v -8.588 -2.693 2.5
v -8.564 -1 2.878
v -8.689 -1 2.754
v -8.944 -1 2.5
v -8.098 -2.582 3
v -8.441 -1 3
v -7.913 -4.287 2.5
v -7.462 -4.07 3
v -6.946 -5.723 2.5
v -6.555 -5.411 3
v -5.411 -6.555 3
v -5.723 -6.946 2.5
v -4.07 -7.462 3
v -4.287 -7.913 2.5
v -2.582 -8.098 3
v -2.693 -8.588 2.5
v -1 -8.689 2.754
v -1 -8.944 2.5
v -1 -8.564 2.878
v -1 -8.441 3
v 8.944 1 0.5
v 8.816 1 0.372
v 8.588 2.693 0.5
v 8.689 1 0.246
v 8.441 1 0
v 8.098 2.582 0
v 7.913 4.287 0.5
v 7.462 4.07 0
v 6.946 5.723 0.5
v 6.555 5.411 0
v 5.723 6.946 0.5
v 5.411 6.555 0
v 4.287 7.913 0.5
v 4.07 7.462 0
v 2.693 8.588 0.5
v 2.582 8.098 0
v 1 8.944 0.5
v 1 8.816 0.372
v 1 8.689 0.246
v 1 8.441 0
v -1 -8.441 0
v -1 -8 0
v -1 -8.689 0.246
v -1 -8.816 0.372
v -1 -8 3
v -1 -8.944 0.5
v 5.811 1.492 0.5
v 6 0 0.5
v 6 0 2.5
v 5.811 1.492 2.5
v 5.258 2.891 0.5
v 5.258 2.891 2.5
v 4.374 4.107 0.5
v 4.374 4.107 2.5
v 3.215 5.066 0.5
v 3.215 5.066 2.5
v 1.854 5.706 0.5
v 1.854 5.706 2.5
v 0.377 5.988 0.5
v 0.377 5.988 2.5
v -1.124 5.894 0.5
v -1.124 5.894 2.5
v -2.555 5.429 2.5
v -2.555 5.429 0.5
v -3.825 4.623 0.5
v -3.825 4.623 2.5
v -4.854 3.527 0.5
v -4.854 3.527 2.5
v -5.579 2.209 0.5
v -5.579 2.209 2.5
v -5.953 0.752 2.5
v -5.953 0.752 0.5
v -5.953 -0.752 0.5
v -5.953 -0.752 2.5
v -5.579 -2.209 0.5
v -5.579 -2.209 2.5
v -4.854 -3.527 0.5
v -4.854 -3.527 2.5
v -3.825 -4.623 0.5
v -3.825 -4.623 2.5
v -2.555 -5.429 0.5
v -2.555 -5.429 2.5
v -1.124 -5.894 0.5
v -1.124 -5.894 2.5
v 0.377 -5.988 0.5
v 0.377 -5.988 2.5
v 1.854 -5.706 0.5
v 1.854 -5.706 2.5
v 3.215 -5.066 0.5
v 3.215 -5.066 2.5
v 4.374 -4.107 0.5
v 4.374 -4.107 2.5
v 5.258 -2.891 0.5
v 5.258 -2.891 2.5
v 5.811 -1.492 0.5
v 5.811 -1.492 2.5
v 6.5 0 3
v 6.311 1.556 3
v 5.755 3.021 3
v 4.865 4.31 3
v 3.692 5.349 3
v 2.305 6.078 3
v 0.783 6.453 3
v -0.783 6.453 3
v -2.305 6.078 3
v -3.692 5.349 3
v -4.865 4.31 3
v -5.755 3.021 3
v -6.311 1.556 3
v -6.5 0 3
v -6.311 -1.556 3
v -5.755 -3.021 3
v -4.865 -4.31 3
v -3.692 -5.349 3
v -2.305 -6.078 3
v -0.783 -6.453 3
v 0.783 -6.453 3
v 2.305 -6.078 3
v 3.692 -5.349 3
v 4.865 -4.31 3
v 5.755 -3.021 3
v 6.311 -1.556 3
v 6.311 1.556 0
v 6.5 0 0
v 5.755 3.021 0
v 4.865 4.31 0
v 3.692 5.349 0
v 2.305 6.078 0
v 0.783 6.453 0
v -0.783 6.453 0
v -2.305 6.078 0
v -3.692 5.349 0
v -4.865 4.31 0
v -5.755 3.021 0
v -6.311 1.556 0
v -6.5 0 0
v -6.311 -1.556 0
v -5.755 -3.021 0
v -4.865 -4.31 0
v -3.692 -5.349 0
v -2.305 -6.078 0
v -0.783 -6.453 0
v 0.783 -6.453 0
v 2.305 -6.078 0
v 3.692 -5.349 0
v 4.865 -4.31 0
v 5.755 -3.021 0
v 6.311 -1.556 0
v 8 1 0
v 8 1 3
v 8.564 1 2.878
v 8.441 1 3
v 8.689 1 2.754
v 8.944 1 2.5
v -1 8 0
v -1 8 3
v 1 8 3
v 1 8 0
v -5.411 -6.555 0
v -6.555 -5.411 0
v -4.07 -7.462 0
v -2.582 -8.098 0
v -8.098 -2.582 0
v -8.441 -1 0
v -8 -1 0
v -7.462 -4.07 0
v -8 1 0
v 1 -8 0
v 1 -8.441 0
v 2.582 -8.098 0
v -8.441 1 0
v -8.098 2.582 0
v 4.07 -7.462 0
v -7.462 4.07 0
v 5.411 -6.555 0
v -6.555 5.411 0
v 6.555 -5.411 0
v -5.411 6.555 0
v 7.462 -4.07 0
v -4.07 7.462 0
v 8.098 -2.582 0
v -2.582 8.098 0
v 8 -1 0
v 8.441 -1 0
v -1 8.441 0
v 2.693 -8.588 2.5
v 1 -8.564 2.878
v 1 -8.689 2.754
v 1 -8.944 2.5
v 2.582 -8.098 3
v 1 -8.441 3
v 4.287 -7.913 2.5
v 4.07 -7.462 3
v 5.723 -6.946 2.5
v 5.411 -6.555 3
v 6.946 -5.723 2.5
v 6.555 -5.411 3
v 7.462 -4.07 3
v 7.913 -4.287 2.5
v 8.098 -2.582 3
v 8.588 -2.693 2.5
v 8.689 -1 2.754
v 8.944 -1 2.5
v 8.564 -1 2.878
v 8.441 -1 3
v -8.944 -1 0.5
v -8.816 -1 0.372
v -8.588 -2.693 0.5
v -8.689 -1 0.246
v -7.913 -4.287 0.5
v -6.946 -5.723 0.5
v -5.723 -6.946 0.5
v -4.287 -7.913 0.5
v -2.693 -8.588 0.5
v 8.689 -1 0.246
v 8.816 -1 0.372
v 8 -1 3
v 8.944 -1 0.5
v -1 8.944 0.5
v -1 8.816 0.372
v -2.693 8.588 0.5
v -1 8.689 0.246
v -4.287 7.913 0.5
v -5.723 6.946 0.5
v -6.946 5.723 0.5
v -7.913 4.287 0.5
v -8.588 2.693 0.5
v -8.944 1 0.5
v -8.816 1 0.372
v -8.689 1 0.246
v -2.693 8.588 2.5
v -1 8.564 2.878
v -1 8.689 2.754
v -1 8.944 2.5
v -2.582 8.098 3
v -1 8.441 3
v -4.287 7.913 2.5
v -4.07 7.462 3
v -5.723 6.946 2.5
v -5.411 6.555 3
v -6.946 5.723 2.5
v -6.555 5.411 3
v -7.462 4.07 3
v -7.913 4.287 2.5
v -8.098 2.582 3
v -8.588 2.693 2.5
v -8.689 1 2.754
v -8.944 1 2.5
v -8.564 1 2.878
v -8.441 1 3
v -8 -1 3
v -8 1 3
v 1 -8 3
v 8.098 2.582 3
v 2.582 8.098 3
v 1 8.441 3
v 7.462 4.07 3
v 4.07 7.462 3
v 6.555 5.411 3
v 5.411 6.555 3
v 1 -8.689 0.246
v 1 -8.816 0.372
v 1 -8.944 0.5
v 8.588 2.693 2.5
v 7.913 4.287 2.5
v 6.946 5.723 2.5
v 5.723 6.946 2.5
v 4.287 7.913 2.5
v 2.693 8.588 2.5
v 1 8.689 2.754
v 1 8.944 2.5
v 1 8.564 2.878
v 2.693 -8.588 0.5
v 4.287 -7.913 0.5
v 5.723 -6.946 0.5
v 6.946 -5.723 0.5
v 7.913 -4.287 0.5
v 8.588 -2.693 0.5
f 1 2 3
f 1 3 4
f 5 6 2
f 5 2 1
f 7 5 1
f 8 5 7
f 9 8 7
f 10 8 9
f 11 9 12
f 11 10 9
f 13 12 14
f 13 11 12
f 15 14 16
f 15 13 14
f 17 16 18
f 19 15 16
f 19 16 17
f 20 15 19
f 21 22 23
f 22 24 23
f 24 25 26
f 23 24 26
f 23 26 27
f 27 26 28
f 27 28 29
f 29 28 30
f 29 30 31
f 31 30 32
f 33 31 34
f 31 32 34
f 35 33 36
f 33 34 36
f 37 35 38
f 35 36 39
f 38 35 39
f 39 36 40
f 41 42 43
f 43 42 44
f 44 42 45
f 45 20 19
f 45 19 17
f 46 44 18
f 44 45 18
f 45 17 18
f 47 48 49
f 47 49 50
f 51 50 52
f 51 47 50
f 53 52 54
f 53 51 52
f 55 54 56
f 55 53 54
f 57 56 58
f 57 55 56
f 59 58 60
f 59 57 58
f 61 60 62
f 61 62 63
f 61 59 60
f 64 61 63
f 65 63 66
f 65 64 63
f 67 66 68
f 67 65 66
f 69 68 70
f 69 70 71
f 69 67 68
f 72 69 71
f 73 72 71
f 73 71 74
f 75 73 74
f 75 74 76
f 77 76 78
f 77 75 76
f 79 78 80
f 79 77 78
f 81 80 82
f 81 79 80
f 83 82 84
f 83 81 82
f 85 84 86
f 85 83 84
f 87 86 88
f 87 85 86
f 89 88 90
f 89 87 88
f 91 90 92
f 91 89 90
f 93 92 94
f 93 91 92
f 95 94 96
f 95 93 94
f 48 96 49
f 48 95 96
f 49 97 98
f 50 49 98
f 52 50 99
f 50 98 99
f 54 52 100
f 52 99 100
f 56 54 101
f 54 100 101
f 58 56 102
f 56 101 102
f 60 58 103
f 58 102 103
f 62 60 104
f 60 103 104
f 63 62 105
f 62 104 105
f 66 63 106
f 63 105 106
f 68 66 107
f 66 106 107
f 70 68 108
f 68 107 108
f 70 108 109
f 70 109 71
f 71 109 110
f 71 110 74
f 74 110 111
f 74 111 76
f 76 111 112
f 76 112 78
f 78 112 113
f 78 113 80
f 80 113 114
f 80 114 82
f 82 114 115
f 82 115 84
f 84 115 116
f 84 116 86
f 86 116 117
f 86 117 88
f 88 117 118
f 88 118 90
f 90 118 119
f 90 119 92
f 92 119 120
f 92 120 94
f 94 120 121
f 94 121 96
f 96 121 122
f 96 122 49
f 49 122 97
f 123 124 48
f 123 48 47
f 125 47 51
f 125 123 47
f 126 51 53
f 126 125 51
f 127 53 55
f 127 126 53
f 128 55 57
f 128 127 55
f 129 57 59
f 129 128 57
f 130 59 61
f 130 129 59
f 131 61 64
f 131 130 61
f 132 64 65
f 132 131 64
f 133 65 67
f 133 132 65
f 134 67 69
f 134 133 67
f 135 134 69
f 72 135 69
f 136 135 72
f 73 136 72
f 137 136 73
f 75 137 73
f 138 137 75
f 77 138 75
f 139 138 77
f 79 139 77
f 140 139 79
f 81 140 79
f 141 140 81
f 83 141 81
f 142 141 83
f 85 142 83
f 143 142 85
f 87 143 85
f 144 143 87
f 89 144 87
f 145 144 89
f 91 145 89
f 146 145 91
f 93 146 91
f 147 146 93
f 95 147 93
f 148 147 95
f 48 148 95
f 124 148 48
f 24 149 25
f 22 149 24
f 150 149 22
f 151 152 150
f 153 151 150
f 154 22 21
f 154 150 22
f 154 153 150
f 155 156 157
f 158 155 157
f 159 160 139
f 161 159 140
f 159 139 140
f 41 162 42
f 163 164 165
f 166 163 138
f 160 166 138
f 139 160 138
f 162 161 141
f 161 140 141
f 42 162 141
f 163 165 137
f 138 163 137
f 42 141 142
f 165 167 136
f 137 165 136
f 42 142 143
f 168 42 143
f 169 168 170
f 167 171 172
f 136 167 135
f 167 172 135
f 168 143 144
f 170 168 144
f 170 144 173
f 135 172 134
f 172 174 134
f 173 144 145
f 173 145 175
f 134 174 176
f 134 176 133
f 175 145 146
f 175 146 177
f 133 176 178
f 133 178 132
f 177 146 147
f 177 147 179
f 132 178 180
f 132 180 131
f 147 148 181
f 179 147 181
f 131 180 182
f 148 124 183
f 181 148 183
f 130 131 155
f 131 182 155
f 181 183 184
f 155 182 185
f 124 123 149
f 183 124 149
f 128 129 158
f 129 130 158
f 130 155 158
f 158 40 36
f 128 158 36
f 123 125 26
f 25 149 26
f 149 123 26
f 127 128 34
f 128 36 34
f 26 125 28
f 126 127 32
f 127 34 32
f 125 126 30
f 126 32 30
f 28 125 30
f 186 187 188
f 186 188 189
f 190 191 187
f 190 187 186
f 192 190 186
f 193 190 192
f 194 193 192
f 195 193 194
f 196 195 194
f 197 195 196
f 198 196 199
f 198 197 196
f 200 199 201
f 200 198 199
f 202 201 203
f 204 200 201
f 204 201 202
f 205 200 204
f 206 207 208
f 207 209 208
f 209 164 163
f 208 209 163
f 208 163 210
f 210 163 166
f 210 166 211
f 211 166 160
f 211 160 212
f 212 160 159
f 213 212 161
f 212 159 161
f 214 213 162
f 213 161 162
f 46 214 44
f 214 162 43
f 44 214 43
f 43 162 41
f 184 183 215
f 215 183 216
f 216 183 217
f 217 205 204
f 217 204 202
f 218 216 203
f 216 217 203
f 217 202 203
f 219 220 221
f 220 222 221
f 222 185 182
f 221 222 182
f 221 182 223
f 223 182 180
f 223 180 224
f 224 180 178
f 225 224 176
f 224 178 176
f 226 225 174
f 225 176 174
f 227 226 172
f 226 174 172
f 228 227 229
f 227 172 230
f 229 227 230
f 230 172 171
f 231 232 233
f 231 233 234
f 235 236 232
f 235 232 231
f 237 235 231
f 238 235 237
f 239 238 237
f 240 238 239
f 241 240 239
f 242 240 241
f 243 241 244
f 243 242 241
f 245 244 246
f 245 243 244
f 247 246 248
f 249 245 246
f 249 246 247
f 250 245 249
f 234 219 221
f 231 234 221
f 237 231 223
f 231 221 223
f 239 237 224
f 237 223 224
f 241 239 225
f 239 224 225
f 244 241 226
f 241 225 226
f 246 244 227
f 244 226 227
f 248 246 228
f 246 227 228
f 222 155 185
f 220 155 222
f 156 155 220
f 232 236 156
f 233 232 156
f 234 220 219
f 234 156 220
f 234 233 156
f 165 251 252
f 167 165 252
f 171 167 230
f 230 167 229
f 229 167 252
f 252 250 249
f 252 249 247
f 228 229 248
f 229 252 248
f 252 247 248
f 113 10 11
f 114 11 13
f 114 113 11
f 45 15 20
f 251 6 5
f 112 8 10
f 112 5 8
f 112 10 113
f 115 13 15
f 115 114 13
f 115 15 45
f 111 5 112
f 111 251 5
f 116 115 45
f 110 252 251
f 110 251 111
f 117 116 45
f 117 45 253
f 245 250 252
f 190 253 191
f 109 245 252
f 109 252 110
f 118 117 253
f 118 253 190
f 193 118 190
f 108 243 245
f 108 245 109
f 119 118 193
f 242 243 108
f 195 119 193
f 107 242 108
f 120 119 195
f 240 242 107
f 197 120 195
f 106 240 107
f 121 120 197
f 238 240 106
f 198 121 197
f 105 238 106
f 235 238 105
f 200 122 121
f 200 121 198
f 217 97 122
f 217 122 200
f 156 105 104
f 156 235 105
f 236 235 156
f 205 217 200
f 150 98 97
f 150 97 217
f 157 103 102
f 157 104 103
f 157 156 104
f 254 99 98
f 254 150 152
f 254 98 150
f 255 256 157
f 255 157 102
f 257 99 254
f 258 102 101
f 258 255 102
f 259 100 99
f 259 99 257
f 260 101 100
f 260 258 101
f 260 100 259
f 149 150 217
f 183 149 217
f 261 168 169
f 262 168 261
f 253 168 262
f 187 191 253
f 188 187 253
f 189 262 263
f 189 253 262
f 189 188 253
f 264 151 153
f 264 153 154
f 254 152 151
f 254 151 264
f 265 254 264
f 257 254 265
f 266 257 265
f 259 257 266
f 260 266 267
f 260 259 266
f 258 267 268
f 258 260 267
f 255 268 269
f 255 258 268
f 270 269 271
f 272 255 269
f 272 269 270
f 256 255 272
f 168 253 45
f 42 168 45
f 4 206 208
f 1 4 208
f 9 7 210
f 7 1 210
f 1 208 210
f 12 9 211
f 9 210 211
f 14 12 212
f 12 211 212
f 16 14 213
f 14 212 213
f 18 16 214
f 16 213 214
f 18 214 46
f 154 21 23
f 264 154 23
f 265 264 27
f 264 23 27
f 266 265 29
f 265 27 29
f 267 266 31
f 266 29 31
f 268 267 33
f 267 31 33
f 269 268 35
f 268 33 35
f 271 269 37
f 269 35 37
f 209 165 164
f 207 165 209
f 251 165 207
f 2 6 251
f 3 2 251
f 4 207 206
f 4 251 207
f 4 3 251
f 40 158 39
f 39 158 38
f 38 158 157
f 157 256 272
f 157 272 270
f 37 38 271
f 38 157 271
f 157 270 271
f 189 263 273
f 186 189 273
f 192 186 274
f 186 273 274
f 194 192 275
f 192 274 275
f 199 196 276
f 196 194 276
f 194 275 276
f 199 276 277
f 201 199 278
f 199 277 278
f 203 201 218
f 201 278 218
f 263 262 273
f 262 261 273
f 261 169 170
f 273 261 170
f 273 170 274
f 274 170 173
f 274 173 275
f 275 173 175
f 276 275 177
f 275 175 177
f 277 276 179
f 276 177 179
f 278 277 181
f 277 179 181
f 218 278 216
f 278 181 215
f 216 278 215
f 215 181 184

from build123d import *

# Parameters (mm, degrees)
SKETCH_1_R               = 9
SKETCH_1_R_2             = 6
EXTRUDE_1_DEPTH          = 3
CHAMFER_1_SIZE           = 0.5
SKETCH_2_W               = 2
SKETCH_2_H               = 2
CUT_EXTRUDE_1_DEPTH      = 14.076696831
PATTERN_CIRCULAR_1_COUNT = 4


with BuildPart() as part:
    # Эскиз1 → Бобышка-Вытянуть1 (new body)
    with BuildSketch(Plane.XY):
        Circle(SKETCH_1_R)
        Circle(SKETCH_1_R_2, mode=Mode.SUBTRACT)
    extrude(amount=EXTRUDE_1_DEPTH)

    # Фаска1
    chamfer_1_edges = [part.edges().sort_by_distance(p)[0] for p in [
        (-9, 0, 0),
        (-9, 0, 3),
        (-6, 0, 0),
        (-6, 0, 3),
    ]]
    chamfer(chamfer_1_edges, length=CHAMFER_1_SIZE)

    # Эскиз2 → Вырез-Вытянуть1 (cut, through all)
    with BuildSketch(Plane.XY.offset(3)):
        with Locations((0, 9)):
            Rectangle(SKETCH_2_W, SKETCH_2_H)
    cut_extrude_1 = extrude(amount=-CUT_EXTRUDE_1_DEPTH, mode=Mode.SUBTRACT)

    # Круговой массив1: Вырез-Вытянуть1 ×4 about axis
    pattern_circular_1_axis = Axis((0, 0, 0), (0, 0, 1))
    for i in range(1, PATTERN_CIRCULAR_1_COUNT):
        add(cut_extrude_1.rotate(pattern_circular_1_axis, i * 360 / PATTERN_CIRCULAR_1_COUNT), mode=Mode.SUBTRACT)


solid = part.part
